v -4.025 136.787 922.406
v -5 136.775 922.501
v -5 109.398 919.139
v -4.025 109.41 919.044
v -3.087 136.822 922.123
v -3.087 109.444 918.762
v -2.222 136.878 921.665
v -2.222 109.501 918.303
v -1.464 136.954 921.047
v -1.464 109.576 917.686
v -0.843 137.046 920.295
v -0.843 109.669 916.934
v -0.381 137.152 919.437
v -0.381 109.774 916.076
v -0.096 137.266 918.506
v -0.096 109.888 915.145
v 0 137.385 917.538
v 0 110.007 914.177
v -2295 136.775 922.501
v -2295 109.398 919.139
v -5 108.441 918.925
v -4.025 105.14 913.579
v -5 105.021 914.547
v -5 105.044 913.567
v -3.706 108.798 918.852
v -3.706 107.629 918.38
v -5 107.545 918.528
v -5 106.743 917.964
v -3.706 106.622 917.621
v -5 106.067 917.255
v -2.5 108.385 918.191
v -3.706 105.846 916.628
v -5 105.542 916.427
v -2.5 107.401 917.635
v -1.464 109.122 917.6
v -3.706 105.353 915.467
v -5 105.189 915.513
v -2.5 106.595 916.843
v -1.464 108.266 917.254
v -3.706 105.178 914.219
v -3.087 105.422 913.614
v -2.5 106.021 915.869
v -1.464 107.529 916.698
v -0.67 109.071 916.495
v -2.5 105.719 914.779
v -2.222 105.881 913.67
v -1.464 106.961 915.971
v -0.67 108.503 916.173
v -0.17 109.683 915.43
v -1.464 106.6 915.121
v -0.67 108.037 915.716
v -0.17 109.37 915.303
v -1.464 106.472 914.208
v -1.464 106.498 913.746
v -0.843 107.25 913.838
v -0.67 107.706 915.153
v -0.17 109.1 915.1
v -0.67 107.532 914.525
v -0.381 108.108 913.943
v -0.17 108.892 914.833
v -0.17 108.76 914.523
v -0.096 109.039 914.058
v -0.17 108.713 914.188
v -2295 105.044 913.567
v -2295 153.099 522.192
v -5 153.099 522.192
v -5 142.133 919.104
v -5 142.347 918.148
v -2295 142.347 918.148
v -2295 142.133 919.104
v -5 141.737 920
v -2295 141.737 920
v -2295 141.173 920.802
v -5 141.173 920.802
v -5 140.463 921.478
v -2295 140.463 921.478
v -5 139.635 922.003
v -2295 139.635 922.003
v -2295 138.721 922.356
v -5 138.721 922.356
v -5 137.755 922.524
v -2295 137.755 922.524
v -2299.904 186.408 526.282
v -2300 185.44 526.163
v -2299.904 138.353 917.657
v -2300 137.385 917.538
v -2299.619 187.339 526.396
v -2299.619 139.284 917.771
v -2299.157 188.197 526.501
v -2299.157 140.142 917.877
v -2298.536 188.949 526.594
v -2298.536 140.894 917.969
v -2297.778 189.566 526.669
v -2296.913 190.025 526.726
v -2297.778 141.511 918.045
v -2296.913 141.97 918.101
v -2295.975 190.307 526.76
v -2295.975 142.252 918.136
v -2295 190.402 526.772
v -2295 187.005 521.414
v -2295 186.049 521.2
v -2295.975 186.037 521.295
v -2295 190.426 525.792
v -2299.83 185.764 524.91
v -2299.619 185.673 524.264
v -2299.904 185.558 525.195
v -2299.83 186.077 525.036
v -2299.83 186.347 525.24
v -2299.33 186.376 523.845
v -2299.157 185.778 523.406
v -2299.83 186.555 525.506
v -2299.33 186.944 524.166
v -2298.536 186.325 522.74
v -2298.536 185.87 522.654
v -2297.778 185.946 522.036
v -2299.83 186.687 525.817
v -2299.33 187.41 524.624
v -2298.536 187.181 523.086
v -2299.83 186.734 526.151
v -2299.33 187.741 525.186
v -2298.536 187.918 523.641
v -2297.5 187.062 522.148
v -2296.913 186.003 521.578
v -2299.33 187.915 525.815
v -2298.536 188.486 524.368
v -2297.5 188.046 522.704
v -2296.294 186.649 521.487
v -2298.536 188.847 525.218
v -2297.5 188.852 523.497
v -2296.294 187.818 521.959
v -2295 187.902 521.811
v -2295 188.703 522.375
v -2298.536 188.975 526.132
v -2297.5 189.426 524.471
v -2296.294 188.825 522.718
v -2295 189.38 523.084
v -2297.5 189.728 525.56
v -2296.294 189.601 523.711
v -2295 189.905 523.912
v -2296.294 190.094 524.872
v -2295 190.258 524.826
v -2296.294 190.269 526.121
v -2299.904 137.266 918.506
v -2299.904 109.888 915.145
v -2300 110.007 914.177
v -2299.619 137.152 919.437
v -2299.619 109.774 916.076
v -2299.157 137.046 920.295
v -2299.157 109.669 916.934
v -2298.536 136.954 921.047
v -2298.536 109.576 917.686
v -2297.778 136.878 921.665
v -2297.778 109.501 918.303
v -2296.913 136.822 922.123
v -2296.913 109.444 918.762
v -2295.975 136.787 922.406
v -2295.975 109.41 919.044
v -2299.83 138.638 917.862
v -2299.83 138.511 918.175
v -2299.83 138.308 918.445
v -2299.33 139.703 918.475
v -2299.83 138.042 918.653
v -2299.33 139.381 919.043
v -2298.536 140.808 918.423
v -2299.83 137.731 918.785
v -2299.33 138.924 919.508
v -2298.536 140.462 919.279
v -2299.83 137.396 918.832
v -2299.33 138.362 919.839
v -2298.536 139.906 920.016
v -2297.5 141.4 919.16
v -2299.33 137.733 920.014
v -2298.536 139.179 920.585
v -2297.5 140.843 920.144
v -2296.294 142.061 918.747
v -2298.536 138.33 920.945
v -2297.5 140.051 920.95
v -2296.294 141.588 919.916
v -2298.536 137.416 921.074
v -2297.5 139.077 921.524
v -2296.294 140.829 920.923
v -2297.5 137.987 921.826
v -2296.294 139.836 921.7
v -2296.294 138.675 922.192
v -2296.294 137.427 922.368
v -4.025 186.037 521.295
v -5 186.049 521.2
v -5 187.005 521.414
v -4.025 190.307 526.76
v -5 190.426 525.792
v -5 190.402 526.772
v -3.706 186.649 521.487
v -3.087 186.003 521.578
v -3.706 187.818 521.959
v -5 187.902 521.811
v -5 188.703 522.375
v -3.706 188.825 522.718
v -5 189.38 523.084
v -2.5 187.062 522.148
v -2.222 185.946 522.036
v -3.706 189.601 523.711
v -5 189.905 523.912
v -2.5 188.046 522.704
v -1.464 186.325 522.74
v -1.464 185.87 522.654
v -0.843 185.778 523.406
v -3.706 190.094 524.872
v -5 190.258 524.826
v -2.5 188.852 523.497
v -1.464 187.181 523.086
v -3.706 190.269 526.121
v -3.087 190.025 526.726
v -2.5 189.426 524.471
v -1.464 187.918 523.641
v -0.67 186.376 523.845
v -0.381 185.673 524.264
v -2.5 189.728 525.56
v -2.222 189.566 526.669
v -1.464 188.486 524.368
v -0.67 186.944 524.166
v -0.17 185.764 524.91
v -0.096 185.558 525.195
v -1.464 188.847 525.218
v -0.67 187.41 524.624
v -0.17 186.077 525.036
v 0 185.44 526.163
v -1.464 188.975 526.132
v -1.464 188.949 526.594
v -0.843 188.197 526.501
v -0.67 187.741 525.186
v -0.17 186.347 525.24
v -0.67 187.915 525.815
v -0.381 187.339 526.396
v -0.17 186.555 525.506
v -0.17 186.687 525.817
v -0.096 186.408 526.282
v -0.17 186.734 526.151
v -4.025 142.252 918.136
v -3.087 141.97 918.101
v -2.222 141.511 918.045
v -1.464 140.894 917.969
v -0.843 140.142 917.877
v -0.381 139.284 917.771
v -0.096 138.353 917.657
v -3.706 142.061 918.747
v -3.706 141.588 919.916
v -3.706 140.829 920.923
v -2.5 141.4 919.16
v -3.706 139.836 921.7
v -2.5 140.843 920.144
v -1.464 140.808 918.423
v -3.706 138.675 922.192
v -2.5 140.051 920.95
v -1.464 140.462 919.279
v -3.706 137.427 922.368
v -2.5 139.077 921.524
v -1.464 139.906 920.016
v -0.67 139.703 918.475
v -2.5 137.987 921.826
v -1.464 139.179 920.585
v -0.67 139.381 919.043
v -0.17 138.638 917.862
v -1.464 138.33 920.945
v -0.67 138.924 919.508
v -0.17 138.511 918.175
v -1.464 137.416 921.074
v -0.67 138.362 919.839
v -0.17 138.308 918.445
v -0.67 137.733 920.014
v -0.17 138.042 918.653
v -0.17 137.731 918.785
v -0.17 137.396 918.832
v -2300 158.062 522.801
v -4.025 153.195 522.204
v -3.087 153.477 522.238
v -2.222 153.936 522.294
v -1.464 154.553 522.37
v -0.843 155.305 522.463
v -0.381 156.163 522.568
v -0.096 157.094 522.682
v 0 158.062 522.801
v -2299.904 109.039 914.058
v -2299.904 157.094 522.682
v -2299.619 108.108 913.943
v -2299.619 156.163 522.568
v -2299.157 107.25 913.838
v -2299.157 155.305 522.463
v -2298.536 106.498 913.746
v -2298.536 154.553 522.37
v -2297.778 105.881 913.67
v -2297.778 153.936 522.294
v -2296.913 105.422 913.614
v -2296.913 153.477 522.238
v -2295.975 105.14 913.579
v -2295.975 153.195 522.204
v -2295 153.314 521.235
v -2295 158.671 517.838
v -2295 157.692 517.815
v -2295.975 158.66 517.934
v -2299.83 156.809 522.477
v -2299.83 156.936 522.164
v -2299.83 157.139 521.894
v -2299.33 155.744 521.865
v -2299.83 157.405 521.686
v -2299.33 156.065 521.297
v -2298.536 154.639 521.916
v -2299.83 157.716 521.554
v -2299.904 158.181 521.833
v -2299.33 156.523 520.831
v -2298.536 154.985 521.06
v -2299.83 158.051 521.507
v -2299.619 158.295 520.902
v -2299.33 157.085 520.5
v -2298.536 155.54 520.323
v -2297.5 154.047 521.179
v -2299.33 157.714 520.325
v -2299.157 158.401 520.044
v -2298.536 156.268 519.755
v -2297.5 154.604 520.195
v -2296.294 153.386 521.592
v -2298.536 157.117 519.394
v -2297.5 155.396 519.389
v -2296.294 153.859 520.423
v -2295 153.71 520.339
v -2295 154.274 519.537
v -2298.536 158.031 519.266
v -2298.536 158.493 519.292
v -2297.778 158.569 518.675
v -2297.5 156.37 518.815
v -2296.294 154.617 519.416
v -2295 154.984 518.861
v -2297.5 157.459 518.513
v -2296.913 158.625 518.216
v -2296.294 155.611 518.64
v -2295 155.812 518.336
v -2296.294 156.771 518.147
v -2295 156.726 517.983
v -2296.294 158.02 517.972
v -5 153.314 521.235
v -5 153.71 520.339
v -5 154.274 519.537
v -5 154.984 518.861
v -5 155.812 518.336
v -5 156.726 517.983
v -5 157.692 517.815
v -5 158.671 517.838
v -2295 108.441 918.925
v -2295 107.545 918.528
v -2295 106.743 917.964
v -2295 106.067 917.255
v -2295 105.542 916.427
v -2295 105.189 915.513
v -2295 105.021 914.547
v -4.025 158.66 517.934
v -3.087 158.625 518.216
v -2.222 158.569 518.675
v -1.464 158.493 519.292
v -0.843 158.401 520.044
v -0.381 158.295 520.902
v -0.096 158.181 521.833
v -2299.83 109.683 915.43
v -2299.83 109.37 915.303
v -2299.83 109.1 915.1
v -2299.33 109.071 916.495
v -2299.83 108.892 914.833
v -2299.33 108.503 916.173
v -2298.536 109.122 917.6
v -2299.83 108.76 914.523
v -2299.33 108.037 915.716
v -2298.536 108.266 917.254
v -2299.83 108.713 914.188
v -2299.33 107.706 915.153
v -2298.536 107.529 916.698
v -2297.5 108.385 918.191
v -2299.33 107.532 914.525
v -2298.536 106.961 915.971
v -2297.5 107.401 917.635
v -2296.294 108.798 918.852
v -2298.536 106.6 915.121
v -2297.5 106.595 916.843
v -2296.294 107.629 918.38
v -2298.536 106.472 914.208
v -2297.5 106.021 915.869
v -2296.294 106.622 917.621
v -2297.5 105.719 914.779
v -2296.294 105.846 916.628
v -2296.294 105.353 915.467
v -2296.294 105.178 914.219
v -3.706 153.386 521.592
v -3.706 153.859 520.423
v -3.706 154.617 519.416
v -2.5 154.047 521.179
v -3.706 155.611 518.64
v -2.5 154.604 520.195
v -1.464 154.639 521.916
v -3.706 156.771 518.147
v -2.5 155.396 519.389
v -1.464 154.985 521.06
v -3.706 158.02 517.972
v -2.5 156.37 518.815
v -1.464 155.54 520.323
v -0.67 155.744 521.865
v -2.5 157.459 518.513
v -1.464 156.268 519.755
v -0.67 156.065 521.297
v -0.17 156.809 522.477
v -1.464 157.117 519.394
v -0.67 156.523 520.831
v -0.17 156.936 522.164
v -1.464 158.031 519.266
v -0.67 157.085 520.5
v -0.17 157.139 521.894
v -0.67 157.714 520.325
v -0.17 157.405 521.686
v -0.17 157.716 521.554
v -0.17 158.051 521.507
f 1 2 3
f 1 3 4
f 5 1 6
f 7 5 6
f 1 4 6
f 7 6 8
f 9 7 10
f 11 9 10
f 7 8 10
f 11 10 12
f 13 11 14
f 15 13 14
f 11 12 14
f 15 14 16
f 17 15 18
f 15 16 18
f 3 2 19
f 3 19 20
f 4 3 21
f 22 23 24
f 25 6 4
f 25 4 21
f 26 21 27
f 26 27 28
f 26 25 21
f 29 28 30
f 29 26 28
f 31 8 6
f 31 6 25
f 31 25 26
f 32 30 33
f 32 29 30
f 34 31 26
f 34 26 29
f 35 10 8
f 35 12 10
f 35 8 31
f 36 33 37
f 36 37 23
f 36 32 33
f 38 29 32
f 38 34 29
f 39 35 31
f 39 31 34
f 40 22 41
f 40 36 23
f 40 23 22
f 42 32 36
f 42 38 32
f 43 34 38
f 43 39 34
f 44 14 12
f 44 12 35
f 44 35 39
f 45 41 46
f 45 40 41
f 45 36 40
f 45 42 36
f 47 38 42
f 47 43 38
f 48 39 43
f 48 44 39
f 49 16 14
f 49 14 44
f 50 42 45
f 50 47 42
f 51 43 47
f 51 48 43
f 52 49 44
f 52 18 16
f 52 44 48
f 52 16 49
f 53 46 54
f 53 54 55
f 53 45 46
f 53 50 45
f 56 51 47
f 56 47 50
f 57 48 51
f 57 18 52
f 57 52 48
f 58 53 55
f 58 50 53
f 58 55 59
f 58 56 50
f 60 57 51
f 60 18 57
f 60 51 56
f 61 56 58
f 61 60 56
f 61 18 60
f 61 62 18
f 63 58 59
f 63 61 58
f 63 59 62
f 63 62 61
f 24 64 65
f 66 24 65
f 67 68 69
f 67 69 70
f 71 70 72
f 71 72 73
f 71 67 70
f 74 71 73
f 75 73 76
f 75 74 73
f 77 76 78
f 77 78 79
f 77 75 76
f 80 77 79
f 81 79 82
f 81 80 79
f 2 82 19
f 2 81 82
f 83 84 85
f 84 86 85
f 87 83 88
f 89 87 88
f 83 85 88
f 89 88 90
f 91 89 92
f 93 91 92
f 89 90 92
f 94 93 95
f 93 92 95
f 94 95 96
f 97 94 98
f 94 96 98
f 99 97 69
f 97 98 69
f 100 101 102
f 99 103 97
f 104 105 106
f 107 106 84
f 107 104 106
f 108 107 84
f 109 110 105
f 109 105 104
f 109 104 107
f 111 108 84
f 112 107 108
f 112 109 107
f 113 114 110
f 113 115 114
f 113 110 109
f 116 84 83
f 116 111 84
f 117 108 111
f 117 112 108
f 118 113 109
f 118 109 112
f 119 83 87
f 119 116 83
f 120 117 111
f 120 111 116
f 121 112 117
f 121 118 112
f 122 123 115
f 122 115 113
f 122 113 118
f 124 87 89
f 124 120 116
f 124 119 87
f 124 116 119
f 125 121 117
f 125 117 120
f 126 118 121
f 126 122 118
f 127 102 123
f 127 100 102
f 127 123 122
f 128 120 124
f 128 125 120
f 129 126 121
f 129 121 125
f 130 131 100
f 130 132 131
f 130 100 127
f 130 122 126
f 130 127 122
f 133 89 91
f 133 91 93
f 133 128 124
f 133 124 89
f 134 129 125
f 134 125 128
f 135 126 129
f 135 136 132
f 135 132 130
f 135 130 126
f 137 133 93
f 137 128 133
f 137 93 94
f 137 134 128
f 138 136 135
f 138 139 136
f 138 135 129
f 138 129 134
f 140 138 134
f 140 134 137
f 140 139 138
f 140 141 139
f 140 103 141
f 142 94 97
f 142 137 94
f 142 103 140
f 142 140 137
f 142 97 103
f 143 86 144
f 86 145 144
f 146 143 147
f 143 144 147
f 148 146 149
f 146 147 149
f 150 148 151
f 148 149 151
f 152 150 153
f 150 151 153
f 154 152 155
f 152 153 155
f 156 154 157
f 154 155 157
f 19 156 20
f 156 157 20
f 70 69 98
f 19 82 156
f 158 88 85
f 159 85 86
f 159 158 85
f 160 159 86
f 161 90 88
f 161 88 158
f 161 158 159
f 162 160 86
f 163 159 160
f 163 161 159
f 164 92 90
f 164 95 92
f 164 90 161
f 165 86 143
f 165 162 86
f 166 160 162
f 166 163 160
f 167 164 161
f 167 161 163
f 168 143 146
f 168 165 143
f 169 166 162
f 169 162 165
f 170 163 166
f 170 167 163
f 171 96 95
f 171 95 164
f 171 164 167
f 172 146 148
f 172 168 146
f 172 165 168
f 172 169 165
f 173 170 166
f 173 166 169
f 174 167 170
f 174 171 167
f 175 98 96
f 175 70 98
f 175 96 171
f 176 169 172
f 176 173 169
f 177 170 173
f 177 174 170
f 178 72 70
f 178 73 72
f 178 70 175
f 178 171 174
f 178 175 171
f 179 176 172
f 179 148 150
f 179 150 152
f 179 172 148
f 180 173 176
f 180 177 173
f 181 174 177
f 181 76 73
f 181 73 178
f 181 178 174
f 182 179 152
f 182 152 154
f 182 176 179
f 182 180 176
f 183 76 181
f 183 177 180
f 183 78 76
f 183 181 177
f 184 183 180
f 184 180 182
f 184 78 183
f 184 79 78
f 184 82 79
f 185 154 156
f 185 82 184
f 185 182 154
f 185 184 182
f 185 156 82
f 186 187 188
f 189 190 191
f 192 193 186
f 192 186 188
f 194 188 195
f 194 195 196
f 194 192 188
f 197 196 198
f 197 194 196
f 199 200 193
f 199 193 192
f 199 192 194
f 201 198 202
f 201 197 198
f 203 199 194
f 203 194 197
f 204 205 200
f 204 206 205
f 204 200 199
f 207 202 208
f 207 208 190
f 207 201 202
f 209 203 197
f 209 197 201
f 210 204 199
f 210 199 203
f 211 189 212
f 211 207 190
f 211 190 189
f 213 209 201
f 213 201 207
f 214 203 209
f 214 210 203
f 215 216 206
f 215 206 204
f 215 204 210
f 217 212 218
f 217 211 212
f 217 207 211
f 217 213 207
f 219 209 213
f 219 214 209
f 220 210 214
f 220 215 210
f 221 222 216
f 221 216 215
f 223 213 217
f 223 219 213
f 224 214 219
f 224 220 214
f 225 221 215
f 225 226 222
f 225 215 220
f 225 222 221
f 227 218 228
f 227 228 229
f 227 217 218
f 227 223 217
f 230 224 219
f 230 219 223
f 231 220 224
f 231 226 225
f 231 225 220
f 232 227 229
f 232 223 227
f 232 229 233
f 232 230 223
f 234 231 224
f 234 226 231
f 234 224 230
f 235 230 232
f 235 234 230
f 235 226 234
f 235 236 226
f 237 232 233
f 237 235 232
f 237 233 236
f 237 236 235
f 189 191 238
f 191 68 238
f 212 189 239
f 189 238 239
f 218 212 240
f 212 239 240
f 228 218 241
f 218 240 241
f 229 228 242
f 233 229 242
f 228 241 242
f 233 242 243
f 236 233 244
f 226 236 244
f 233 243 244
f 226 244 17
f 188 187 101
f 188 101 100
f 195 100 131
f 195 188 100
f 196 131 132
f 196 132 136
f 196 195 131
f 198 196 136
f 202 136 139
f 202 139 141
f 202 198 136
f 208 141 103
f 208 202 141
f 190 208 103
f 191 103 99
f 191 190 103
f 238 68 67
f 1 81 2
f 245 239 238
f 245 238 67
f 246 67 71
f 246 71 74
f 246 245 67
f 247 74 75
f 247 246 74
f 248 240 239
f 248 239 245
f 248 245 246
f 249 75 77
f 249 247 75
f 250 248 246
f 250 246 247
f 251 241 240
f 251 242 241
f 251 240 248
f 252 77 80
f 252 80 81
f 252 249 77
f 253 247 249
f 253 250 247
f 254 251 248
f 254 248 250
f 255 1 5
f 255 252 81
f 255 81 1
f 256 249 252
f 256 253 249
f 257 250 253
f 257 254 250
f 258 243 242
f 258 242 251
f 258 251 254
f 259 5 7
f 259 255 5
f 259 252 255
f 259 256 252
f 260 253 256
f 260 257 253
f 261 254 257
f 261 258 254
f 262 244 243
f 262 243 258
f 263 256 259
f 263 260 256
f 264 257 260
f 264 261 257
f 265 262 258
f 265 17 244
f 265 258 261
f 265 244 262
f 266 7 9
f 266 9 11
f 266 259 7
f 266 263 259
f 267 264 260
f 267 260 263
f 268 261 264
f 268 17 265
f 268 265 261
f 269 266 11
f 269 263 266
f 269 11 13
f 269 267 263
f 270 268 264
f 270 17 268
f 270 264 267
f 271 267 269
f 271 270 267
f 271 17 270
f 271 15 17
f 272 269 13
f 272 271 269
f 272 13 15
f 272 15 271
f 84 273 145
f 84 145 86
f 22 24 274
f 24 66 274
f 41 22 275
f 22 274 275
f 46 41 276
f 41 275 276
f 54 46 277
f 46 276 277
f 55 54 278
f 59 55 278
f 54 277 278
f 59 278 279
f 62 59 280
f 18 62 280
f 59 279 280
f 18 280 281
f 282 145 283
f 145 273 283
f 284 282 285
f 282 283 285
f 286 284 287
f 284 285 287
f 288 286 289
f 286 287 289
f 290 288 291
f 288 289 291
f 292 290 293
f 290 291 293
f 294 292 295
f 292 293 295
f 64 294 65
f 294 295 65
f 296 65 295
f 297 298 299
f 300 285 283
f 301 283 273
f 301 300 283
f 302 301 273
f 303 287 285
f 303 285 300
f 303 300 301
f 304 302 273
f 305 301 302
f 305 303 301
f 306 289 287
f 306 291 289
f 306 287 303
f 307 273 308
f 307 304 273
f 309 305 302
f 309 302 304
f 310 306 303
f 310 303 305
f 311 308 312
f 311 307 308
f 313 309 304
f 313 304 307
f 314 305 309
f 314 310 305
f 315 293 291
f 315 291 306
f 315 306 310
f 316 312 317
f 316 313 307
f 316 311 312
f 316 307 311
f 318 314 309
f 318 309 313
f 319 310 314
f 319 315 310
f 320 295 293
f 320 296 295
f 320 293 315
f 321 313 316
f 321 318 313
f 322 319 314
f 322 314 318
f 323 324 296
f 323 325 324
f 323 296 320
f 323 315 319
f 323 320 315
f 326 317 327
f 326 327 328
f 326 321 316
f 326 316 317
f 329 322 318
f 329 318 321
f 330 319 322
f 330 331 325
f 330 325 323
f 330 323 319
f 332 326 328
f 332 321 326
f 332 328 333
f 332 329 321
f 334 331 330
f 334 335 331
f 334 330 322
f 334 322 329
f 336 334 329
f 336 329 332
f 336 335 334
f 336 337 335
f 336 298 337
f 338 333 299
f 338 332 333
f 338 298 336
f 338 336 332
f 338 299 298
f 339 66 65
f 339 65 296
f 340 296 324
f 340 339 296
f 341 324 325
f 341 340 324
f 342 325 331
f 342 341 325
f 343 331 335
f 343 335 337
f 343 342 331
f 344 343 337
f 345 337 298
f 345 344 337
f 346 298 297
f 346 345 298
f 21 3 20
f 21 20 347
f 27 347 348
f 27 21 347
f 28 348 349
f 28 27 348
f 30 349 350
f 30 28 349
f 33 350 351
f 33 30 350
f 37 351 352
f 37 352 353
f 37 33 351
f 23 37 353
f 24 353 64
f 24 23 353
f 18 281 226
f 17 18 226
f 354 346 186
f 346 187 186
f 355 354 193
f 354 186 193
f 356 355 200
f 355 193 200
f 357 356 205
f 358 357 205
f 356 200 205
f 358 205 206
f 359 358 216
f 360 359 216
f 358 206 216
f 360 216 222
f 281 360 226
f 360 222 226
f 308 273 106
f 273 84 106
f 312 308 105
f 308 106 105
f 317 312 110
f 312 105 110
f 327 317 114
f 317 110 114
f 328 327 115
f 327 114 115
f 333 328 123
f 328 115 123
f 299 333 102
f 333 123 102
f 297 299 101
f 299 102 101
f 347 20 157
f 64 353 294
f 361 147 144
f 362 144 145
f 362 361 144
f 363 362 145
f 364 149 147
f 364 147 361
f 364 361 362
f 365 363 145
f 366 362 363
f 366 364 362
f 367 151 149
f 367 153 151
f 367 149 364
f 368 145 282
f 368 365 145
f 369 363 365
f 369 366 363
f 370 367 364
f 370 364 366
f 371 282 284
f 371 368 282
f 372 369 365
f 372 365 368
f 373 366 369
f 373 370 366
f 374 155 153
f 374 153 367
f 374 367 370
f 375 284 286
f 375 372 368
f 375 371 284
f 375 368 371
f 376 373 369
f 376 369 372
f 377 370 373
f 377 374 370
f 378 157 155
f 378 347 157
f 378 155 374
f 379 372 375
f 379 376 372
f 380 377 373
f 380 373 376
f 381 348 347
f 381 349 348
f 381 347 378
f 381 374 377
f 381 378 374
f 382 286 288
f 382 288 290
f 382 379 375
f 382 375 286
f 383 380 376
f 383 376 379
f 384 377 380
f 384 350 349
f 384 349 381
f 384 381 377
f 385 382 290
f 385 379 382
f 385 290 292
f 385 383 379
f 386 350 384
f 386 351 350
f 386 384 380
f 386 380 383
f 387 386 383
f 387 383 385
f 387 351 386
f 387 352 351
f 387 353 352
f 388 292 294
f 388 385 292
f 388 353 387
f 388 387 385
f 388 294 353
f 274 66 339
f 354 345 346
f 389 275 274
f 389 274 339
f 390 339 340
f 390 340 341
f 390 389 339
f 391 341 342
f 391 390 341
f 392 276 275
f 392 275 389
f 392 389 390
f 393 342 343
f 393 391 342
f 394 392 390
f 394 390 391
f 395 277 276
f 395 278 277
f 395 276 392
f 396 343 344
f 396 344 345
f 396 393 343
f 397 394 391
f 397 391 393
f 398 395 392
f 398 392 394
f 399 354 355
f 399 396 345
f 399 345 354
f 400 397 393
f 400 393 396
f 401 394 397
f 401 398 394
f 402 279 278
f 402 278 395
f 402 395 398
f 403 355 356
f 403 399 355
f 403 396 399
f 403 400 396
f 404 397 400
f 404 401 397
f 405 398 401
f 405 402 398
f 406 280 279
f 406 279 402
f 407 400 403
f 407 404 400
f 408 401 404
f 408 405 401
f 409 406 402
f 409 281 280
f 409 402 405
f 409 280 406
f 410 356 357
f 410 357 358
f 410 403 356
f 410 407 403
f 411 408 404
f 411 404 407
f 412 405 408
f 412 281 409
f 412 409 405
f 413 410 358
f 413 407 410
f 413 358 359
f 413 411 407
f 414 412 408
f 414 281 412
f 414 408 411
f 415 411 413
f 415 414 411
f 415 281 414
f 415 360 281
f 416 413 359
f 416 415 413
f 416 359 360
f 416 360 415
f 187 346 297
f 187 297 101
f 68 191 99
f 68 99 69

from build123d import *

# Parameters (mm, degrees)
F1_DEPTH = 2300
F2_R     = 5
F3_R     = 5


with BuildPart() as f1:
    # F0 (on Right) → F1 (new body)
    with BuildSketch(Plane.YZ):
        with BuildLine():
            ThreePointArc((109.3978564406, 919.1393998067), (106.0671493896, 917.2549764252), (105.0444723994, 913.5673223315))
            Line((105.0444723994, 913.5673223315), (153.0993439735, 522.1918006805))
            ThreePointArc((153.0993439735, 522.1918006805), (154.983767355, 518.8610936295), (158.6714214487, 517.8384166393))
            Line((158.6714214487, 517.8384166393), (186.0489625337, 521.199956))
            ThreePointArc((186.0489625337, 521.199956), (189.3796695847, 523.0843793816), (190.4023465749, 526.7720334753))
            Line((190.4023465749, 526.7720334753), (142.3474750008, 918.1475551263))
            ThreePointArc((142.3474750008, 918.1475551263), (140.4630516192, 921.4782621773), (136.7753975256, 922.5009391675))
            Line((136.7753975256, 922.5009391675), (109.3978564406, 919.1393998067))
        make_face()
    extrude(amount=-F1_DEPTH)

    # F2
    f2_edges = [f1.edges().sort_by_distance(p)[0] for p in [
        (0, 140.463052, 921.478262),
        (0, 123.086627, 920.820169),
        (0, 106.067149, 917.254976),
        (0, 129.071908, 717.879562),
        (0, 154.983767, 518.861094),
        (0, 172.360192, 519.519186),
        (0, 189.37967, 523.084379),
        (0, 166.374911, 722.459794),
    ]]
    fillet(f2_edges, radius=F2_R)

    # F3
    f3_edges = [f1.edges().sort_by_distance(p)[0] for p in [
        (-2300, 140.463052, 921.478262),
        (-2300, 123.086627, 920.820169),
        (-2300, 106.067149, 917.254976),
        (-2300, 129.071908, 717.879562),
        (-2300, 154.983767, 518.861094),
        (-2300, 172.360192, 519.519186),
        (-2300, 189.37967, 523.084379),
        (-2300, 166.374911, 722.459794),
    ]]
    fillet(f3_edges, radius=F3_R)


solid = f1.part
